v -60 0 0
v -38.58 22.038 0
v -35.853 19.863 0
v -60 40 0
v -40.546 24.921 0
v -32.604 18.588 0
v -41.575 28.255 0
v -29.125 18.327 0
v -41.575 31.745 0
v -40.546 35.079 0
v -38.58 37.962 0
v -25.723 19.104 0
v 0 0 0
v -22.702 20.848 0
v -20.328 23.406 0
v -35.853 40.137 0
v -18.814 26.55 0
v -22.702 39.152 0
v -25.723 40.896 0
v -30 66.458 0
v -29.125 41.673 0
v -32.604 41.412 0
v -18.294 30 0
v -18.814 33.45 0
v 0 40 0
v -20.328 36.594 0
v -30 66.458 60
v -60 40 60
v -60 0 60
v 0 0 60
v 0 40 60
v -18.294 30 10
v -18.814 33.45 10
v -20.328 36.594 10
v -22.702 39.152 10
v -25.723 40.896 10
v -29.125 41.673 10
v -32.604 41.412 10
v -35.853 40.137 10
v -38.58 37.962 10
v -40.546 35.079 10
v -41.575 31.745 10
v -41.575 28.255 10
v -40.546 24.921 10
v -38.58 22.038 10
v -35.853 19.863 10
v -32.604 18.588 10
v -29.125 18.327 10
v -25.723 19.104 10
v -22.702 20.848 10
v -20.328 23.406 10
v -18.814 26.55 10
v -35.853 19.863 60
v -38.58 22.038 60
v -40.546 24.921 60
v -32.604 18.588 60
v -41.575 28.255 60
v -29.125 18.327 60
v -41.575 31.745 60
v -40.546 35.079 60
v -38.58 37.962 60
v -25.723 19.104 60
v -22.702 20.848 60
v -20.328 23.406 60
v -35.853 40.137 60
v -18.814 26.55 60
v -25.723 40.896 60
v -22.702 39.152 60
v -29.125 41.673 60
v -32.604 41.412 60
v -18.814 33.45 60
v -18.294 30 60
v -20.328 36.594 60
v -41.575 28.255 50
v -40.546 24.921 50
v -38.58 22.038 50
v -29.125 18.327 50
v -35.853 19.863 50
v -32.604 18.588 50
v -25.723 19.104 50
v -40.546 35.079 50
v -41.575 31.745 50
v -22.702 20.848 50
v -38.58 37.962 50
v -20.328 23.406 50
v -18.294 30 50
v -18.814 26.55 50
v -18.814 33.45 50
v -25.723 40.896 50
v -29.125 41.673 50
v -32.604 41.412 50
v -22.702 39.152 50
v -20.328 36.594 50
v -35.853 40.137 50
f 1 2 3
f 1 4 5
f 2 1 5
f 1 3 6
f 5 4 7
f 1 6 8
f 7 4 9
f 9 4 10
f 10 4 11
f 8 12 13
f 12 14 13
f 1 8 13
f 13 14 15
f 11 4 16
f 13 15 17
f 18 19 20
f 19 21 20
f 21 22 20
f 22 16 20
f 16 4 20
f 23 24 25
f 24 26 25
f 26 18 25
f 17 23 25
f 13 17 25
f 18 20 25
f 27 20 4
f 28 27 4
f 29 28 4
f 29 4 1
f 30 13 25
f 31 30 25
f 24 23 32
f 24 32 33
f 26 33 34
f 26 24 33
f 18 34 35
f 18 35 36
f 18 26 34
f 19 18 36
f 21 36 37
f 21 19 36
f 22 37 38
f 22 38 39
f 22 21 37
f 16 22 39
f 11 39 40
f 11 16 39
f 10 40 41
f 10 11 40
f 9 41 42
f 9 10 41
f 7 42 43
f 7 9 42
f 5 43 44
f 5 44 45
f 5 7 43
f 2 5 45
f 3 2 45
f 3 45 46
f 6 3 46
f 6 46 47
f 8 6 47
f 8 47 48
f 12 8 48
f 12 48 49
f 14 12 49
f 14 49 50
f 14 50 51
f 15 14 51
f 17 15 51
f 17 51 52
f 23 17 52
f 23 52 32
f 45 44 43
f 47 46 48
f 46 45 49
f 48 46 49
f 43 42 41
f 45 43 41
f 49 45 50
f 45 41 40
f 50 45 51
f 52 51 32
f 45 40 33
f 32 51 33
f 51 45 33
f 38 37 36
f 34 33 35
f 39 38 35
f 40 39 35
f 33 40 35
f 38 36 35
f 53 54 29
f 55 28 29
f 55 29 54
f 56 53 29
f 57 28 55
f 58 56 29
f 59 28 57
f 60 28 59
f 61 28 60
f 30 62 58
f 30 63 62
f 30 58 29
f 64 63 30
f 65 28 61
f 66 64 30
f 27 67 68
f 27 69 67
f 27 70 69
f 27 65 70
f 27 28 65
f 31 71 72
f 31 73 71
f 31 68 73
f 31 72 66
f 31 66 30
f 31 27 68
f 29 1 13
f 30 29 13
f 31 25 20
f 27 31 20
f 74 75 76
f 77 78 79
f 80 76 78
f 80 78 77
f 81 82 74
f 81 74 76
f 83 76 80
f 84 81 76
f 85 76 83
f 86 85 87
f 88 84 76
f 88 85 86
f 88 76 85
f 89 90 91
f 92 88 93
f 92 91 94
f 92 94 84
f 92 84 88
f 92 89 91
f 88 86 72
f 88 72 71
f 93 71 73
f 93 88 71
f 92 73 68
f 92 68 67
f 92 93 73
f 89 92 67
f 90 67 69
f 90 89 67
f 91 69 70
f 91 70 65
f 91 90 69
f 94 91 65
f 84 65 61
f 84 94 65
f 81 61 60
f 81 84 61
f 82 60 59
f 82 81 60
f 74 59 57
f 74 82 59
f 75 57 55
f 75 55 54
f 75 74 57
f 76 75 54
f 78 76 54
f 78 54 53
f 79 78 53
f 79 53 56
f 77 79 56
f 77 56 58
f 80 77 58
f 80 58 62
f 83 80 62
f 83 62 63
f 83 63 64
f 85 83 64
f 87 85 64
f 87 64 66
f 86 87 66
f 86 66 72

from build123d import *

# Parameters (mm, degrees)
F0_R     = 11.7054565065
F1_DEPTH = 60
F2_START = 10
F2_DEPTH = 40


# Not quite as in the source:
# - a feature names something its author has since deleted; it is built from what else it names


with BuildPart() as f1:
    # F0 (on Top) → F1 (new body)
    with BuildSketch(Plane.XY):
        Polygon((-60, 40.0004889347), (-60, 0), (0, 0), (0, 40), (-29.9997844001, 66.457757576), align=None)
        with Locations((-29.9997844001, 30)):
            Circle(F0_R, mode=Mode.SUBTRACT)
    extrude(amount=F1_DEPTH)

    # F0 (on Top) → F2 (join)
    with BuildSketch(Plane.XY.offset(F2_START)):
        with Locations((-29.9997844001, 30)):
            Circle(F0_R)
    extrude(amount=F2_DEPTH)


solid = f1.part
